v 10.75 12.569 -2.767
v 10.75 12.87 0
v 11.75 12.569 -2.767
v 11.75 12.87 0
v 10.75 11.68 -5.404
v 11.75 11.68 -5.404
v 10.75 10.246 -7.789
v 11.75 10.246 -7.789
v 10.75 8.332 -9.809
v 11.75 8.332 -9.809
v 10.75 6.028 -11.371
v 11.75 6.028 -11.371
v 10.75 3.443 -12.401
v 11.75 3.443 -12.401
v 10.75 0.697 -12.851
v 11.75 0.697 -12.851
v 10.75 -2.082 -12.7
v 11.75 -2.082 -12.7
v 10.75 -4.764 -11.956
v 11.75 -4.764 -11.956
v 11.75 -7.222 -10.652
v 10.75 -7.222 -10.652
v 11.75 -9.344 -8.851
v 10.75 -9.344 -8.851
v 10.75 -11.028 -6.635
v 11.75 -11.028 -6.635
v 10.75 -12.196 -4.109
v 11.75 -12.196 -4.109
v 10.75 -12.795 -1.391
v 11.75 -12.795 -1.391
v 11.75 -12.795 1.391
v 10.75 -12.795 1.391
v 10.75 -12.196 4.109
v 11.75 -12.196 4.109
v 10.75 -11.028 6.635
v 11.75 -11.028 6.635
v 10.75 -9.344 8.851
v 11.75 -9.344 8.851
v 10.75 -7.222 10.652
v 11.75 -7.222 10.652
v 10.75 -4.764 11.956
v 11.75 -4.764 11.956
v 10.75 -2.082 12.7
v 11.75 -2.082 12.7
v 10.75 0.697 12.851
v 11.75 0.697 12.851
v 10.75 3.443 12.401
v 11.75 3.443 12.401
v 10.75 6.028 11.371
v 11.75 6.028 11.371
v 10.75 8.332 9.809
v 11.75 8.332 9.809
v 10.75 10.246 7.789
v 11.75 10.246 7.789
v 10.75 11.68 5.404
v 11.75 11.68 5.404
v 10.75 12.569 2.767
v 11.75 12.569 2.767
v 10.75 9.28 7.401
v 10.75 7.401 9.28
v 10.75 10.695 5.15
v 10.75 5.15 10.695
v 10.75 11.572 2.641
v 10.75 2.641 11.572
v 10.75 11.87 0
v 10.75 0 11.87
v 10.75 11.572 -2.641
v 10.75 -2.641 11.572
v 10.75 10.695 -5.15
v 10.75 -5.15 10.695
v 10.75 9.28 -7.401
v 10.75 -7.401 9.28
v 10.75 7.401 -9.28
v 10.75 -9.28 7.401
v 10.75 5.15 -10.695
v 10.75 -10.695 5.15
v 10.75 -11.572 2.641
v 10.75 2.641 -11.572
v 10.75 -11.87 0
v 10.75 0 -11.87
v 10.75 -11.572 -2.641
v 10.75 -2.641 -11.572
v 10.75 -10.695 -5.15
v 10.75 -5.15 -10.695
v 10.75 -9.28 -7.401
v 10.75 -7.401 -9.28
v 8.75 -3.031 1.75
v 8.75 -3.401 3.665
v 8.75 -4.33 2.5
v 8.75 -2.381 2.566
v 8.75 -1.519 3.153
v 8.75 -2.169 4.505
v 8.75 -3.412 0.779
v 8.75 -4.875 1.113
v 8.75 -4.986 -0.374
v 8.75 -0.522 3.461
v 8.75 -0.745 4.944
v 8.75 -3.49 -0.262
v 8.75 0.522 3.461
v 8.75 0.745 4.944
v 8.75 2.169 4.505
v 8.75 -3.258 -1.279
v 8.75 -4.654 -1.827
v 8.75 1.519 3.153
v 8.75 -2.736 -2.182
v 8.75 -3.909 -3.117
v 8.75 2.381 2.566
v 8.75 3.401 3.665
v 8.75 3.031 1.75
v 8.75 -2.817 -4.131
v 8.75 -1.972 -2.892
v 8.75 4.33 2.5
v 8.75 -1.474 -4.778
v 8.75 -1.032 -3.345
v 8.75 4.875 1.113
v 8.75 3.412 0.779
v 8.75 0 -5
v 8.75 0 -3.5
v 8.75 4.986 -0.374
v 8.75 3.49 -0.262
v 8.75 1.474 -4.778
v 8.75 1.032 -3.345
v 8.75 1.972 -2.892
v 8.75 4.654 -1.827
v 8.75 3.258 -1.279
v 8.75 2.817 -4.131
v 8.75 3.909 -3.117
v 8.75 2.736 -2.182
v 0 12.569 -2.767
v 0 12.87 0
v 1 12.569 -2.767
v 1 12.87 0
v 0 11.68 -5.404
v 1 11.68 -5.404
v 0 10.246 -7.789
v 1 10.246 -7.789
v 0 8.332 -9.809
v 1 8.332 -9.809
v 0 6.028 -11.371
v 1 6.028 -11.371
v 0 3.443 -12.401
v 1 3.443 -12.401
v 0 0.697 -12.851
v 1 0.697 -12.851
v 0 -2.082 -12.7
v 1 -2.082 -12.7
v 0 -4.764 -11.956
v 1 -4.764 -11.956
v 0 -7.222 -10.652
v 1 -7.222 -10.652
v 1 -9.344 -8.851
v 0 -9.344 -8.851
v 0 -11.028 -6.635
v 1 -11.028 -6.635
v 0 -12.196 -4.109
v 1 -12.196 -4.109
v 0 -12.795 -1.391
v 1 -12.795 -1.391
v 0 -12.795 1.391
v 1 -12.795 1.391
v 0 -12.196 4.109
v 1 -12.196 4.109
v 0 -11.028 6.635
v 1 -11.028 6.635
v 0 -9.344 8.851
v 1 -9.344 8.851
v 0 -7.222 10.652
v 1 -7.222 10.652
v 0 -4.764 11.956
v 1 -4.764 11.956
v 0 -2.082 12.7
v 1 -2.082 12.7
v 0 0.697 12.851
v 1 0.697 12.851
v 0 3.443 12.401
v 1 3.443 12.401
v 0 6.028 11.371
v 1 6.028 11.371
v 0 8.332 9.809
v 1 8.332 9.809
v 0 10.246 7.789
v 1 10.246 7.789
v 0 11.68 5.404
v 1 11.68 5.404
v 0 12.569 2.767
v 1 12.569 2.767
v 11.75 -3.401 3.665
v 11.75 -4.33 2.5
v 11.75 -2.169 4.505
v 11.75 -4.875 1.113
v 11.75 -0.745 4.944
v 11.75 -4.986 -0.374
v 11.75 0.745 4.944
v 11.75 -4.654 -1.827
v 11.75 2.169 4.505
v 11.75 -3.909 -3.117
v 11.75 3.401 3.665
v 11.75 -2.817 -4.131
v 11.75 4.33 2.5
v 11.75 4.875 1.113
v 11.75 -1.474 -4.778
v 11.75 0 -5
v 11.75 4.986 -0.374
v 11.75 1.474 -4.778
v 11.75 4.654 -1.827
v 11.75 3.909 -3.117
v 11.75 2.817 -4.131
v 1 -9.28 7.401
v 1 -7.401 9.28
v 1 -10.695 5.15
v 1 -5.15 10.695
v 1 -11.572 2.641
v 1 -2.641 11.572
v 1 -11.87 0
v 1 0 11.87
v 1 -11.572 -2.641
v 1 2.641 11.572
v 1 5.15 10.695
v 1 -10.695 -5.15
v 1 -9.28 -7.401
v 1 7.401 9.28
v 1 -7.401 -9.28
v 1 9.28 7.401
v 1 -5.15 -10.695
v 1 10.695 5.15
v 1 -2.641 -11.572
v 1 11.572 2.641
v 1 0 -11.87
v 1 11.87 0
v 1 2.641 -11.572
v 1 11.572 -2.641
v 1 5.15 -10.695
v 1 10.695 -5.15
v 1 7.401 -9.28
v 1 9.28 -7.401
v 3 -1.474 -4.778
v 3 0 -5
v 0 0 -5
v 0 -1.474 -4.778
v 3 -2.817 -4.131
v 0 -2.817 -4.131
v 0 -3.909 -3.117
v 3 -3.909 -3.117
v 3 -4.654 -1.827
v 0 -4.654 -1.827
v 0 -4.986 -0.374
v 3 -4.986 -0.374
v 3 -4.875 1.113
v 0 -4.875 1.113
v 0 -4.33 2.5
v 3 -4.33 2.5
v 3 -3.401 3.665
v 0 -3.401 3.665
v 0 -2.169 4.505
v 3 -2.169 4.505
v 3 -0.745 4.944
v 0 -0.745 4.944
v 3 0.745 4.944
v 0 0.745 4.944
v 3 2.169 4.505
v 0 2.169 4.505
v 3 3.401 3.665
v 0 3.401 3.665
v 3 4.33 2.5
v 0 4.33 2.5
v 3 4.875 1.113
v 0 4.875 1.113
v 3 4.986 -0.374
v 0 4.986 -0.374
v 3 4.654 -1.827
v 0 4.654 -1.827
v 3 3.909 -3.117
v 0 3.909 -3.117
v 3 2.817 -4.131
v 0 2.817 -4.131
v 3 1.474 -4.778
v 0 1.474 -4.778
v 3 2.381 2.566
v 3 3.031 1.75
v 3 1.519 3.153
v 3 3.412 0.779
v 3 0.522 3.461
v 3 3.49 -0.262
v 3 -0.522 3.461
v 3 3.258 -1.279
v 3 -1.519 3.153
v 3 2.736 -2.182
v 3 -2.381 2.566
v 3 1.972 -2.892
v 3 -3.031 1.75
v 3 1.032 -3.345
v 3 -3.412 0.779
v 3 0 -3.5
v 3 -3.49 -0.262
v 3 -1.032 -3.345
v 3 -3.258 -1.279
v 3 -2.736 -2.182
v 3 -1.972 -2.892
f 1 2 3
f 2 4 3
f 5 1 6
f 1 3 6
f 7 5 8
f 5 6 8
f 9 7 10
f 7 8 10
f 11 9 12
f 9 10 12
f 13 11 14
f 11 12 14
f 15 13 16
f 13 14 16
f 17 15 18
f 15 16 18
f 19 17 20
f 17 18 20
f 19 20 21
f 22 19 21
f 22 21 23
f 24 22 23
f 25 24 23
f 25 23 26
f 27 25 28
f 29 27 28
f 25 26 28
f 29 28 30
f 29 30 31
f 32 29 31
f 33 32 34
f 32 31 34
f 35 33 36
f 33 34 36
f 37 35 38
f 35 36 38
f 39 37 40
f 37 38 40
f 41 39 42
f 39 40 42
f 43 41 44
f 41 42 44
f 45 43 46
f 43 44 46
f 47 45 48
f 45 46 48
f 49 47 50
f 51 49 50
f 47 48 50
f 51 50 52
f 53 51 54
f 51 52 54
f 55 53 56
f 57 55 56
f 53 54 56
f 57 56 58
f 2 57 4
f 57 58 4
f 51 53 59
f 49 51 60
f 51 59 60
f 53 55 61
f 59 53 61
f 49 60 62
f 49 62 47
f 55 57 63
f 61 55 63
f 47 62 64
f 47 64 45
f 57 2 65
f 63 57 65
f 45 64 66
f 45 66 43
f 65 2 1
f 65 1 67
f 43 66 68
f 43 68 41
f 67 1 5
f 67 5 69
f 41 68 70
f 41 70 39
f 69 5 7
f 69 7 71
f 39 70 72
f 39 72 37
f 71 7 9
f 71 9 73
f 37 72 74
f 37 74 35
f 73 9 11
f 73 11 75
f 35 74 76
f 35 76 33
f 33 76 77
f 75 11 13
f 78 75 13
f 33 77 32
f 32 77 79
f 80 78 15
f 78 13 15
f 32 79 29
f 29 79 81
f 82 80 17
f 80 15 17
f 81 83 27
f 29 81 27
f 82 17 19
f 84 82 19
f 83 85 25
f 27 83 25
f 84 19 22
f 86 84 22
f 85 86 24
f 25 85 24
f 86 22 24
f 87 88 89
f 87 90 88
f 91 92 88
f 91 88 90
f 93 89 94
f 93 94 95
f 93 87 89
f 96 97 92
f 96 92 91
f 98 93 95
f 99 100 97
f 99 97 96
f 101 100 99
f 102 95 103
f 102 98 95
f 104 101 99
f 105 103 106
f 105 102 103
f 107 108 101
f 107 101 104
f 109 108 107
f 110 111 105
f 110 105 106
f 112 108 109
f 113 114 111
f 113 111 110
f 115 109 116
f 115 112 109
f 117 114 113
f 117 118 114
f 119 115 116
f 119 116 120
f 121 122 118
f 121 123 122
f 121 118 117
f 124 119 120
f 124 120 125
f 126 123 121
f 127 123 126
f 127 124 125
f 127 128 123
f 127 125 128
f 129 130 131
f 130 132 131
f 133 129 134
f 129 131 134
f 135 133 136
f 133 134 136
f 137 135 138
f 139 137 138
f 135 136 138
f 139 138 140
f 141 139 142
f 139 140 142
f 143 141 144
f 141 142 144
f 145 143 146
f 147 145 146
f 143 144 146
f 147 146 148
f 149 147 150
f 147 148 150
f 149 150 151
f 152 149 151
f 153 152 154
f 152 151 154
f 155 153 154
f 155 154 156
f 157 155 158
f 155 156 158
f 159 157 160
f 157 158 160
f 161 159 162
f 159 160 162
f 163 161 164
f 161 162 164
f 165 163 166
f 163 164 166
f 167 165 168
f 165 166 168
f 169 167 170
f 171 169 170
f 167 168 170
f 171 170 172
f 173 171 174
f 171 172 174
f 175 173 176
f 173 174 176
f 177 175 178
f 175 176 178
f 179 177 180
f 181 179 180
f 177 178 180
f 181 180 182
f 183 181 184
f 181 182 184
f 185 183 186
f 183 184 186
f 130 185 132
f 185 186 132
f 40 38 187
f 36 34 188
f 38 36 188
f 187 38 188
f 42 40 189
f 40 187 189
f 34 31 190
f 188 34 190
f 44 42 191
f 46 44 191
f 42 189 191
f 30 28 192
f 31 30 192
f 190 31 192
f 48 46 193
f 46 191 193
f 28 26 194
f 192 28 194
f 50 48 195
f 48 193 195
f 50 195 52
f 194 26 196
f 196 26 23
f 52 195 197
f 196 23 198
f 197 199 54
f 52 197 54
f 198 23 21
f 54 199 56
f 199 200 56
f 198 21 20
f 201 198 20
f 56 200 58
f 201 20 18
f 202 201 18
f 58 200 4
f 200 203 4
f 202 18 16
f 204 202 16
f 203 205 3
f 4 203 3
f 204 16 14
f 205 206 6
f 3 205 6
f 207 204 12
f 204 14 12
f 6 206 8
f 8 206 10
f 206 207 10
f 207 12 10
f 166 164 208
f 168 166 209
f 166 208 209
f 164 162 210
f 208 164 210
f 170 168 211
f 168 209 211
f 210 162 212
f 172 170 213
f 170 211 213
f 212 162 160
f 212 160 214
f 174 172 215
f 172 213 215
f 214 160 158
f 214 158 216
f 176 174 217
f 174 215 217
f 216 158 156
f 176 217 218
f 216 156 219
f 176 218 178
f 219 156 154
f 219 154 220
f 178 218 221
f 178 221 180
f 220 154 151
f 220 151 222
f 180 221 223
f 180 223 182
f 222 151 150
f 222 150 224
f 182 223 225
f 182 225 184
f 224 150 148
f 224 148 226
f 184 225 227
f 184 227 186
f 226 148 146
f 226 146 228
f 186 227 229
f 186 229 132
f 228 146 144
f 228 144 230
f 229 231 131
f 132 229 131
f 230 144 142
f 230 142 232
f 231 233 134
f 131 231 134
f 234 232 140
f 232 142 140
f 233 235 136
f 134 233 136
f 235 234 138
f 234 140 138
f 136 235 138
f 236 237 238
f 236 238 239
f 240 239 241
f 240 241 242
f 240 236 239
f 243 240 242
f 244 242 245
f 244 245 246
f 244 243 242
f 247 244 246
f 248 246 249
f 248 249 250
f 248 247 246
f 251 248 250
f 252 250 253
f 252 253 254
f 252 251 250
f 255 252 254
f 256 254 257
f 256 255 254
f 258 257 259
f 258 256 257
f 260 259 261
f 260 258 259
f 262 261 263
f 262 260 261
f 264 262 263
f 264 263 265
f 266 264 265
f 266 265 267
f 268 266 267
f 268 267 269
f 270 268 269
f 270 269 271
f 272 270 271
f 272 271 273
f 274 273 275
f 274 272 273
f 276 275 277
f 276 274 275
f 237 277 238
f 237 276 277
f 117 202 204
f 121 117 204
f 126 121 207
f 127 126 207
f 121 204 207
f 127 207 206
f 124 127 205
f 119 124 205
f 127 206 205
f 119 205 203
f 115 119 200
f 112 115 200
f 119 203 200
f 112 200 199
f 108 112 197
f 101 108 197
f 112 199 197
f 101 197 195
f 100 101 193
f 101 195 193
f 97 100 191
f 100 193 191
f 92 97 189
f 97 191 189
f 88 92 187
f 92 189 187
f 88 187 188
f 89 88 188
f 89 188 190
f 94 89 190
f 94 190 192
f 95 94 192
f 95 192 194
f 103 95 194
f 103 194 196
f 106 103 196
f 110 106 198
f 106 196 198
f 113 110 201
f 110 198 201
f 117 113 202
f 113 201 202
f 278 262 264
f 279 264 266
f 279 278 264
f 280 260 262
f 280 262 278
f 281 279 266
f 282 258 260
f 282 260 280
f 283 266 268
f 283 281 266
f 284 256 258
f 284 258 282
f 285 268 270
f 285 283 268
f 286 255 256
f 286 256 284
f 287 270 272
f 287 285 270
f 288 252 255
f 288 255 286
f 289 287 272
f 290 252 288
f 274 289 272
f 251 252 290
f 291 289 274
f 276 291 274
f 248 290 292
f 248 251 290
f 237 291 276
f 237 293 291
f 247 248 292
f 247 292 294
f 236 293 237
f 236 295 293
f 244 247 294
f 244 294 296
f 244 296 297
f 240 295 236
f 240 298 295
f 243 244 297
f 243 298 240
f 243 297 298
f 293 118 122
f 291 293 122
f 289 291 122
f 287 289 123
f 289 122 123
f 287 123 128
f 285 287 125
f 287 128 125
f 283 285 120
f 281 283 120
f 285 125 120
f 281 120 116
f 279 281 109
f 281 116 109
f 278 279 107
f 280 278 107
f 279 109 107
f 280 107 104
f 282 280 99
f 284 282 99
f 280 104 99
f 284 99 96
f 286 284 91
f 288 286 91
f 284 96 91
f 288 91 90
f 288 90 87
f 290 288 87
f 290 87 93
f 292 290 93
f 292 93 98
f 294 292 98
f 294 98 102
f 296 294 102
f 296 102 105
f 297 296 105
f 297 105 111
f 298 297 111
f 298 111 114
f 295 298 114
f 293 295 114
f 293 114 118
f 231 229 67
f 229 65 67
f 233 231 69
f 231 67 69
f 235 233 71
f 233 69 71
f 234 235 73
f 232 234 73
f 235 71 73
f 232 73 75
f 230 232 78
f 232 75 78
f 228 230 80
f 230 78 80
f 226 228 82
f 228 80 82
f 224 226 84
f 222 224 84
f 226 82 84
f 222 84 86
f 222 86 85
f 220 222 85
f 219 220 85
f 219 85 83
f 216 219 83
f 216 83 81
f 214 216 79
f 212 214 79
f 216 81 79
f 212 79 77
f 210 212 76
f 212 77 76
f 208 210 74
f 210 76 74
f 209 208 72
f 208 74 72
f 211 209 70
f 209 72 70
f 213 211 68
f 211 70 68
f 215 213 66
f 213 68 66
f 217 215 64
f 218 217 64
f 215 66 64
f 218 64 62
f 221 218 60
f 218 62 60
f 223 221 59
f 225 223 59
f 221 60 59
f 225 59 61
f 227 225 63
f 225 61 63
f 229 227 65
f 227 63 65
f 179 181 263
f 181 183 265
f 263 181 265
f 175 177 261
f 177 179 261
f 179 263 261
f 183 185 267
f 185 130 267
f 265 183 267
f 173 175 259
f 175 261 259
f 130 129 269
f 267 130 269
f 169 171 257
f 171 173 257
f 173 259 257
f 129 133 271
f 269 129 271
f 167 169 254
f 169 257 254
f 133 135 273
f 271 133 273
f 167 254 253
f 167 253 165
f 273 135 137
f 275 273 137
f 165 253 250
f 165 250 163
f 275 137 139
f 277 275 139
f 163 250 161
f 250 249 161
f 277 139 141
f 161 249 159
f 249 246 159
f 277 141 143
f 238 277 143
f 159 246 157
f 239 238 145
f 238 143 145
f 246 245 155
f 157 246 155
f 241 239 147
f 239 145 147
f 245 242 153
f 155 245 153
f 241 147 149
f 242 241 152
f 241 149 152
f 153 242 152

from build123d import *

# Parameters (mm, degrees)
SKETCH3_R          = 5
CUT_EXTRUDE1_DEPTH = 3
CUT_EXTRUDE2_START = -3
SKETCH4_R          = 5
CUT_EXTRUDE2_DEPTH = 3
SKETCH5_R          = 3.5
CUT_EXTRUDE3_DEPTH = 21.194957291


with BuildPart() as part:
    # Sketch2 → Revolve1 (revolve)
    with BuildSketch(Plane.XY):
        Polygon((0, 0), (0, 12.87), (1, 12.87), (1, 11.87), (10.75, 11.87), (10.75, 12.87), (11.75, 12.87), (11.75, 0), align=None)
    revolve(axis=Axis((11.75, 0, 0), (-1, 0, 0)))

    # Sketch3 → Cut-Extrude1 (cut)
    with BuildSketch(Plane(origin=(11.75, 0, 0), x_dir=(0, 0, -1), z_dir=(1, 0, 0))):
        Circle(SKETCH3_R)
    extrude(amount=-CUT_EXTRUDE1_DEPTH, mode=Mode.SUBTRACT)

    # Sketch4 → Cut-Extrude2 (cut)
    with BuildSketch(Plane.ZY.offset(CUT_EXTRUDE2_START)):
        with Locations(Location((0, 0, 0), (0, 0, 180))):
            Circle(SKETCH4_R)
    extrude(amount=CUT_EXTRUDE2_DEPTH, mode=Mode.SUBTRACT)

    # Sketch5 → Cut-Extrude3 (cut, through all)
    with BuildSketch(Plane(origin=(8.75, 0, 0), x_dir=(0, 0, -1), z_dir=(1, 0, 0))):
        Circle(SKETCH5_R)
    extrude(amount=-CUT_EXTRUDE3_DEPTH, mode=Mode.SUBTRACT)


solid = part.part
